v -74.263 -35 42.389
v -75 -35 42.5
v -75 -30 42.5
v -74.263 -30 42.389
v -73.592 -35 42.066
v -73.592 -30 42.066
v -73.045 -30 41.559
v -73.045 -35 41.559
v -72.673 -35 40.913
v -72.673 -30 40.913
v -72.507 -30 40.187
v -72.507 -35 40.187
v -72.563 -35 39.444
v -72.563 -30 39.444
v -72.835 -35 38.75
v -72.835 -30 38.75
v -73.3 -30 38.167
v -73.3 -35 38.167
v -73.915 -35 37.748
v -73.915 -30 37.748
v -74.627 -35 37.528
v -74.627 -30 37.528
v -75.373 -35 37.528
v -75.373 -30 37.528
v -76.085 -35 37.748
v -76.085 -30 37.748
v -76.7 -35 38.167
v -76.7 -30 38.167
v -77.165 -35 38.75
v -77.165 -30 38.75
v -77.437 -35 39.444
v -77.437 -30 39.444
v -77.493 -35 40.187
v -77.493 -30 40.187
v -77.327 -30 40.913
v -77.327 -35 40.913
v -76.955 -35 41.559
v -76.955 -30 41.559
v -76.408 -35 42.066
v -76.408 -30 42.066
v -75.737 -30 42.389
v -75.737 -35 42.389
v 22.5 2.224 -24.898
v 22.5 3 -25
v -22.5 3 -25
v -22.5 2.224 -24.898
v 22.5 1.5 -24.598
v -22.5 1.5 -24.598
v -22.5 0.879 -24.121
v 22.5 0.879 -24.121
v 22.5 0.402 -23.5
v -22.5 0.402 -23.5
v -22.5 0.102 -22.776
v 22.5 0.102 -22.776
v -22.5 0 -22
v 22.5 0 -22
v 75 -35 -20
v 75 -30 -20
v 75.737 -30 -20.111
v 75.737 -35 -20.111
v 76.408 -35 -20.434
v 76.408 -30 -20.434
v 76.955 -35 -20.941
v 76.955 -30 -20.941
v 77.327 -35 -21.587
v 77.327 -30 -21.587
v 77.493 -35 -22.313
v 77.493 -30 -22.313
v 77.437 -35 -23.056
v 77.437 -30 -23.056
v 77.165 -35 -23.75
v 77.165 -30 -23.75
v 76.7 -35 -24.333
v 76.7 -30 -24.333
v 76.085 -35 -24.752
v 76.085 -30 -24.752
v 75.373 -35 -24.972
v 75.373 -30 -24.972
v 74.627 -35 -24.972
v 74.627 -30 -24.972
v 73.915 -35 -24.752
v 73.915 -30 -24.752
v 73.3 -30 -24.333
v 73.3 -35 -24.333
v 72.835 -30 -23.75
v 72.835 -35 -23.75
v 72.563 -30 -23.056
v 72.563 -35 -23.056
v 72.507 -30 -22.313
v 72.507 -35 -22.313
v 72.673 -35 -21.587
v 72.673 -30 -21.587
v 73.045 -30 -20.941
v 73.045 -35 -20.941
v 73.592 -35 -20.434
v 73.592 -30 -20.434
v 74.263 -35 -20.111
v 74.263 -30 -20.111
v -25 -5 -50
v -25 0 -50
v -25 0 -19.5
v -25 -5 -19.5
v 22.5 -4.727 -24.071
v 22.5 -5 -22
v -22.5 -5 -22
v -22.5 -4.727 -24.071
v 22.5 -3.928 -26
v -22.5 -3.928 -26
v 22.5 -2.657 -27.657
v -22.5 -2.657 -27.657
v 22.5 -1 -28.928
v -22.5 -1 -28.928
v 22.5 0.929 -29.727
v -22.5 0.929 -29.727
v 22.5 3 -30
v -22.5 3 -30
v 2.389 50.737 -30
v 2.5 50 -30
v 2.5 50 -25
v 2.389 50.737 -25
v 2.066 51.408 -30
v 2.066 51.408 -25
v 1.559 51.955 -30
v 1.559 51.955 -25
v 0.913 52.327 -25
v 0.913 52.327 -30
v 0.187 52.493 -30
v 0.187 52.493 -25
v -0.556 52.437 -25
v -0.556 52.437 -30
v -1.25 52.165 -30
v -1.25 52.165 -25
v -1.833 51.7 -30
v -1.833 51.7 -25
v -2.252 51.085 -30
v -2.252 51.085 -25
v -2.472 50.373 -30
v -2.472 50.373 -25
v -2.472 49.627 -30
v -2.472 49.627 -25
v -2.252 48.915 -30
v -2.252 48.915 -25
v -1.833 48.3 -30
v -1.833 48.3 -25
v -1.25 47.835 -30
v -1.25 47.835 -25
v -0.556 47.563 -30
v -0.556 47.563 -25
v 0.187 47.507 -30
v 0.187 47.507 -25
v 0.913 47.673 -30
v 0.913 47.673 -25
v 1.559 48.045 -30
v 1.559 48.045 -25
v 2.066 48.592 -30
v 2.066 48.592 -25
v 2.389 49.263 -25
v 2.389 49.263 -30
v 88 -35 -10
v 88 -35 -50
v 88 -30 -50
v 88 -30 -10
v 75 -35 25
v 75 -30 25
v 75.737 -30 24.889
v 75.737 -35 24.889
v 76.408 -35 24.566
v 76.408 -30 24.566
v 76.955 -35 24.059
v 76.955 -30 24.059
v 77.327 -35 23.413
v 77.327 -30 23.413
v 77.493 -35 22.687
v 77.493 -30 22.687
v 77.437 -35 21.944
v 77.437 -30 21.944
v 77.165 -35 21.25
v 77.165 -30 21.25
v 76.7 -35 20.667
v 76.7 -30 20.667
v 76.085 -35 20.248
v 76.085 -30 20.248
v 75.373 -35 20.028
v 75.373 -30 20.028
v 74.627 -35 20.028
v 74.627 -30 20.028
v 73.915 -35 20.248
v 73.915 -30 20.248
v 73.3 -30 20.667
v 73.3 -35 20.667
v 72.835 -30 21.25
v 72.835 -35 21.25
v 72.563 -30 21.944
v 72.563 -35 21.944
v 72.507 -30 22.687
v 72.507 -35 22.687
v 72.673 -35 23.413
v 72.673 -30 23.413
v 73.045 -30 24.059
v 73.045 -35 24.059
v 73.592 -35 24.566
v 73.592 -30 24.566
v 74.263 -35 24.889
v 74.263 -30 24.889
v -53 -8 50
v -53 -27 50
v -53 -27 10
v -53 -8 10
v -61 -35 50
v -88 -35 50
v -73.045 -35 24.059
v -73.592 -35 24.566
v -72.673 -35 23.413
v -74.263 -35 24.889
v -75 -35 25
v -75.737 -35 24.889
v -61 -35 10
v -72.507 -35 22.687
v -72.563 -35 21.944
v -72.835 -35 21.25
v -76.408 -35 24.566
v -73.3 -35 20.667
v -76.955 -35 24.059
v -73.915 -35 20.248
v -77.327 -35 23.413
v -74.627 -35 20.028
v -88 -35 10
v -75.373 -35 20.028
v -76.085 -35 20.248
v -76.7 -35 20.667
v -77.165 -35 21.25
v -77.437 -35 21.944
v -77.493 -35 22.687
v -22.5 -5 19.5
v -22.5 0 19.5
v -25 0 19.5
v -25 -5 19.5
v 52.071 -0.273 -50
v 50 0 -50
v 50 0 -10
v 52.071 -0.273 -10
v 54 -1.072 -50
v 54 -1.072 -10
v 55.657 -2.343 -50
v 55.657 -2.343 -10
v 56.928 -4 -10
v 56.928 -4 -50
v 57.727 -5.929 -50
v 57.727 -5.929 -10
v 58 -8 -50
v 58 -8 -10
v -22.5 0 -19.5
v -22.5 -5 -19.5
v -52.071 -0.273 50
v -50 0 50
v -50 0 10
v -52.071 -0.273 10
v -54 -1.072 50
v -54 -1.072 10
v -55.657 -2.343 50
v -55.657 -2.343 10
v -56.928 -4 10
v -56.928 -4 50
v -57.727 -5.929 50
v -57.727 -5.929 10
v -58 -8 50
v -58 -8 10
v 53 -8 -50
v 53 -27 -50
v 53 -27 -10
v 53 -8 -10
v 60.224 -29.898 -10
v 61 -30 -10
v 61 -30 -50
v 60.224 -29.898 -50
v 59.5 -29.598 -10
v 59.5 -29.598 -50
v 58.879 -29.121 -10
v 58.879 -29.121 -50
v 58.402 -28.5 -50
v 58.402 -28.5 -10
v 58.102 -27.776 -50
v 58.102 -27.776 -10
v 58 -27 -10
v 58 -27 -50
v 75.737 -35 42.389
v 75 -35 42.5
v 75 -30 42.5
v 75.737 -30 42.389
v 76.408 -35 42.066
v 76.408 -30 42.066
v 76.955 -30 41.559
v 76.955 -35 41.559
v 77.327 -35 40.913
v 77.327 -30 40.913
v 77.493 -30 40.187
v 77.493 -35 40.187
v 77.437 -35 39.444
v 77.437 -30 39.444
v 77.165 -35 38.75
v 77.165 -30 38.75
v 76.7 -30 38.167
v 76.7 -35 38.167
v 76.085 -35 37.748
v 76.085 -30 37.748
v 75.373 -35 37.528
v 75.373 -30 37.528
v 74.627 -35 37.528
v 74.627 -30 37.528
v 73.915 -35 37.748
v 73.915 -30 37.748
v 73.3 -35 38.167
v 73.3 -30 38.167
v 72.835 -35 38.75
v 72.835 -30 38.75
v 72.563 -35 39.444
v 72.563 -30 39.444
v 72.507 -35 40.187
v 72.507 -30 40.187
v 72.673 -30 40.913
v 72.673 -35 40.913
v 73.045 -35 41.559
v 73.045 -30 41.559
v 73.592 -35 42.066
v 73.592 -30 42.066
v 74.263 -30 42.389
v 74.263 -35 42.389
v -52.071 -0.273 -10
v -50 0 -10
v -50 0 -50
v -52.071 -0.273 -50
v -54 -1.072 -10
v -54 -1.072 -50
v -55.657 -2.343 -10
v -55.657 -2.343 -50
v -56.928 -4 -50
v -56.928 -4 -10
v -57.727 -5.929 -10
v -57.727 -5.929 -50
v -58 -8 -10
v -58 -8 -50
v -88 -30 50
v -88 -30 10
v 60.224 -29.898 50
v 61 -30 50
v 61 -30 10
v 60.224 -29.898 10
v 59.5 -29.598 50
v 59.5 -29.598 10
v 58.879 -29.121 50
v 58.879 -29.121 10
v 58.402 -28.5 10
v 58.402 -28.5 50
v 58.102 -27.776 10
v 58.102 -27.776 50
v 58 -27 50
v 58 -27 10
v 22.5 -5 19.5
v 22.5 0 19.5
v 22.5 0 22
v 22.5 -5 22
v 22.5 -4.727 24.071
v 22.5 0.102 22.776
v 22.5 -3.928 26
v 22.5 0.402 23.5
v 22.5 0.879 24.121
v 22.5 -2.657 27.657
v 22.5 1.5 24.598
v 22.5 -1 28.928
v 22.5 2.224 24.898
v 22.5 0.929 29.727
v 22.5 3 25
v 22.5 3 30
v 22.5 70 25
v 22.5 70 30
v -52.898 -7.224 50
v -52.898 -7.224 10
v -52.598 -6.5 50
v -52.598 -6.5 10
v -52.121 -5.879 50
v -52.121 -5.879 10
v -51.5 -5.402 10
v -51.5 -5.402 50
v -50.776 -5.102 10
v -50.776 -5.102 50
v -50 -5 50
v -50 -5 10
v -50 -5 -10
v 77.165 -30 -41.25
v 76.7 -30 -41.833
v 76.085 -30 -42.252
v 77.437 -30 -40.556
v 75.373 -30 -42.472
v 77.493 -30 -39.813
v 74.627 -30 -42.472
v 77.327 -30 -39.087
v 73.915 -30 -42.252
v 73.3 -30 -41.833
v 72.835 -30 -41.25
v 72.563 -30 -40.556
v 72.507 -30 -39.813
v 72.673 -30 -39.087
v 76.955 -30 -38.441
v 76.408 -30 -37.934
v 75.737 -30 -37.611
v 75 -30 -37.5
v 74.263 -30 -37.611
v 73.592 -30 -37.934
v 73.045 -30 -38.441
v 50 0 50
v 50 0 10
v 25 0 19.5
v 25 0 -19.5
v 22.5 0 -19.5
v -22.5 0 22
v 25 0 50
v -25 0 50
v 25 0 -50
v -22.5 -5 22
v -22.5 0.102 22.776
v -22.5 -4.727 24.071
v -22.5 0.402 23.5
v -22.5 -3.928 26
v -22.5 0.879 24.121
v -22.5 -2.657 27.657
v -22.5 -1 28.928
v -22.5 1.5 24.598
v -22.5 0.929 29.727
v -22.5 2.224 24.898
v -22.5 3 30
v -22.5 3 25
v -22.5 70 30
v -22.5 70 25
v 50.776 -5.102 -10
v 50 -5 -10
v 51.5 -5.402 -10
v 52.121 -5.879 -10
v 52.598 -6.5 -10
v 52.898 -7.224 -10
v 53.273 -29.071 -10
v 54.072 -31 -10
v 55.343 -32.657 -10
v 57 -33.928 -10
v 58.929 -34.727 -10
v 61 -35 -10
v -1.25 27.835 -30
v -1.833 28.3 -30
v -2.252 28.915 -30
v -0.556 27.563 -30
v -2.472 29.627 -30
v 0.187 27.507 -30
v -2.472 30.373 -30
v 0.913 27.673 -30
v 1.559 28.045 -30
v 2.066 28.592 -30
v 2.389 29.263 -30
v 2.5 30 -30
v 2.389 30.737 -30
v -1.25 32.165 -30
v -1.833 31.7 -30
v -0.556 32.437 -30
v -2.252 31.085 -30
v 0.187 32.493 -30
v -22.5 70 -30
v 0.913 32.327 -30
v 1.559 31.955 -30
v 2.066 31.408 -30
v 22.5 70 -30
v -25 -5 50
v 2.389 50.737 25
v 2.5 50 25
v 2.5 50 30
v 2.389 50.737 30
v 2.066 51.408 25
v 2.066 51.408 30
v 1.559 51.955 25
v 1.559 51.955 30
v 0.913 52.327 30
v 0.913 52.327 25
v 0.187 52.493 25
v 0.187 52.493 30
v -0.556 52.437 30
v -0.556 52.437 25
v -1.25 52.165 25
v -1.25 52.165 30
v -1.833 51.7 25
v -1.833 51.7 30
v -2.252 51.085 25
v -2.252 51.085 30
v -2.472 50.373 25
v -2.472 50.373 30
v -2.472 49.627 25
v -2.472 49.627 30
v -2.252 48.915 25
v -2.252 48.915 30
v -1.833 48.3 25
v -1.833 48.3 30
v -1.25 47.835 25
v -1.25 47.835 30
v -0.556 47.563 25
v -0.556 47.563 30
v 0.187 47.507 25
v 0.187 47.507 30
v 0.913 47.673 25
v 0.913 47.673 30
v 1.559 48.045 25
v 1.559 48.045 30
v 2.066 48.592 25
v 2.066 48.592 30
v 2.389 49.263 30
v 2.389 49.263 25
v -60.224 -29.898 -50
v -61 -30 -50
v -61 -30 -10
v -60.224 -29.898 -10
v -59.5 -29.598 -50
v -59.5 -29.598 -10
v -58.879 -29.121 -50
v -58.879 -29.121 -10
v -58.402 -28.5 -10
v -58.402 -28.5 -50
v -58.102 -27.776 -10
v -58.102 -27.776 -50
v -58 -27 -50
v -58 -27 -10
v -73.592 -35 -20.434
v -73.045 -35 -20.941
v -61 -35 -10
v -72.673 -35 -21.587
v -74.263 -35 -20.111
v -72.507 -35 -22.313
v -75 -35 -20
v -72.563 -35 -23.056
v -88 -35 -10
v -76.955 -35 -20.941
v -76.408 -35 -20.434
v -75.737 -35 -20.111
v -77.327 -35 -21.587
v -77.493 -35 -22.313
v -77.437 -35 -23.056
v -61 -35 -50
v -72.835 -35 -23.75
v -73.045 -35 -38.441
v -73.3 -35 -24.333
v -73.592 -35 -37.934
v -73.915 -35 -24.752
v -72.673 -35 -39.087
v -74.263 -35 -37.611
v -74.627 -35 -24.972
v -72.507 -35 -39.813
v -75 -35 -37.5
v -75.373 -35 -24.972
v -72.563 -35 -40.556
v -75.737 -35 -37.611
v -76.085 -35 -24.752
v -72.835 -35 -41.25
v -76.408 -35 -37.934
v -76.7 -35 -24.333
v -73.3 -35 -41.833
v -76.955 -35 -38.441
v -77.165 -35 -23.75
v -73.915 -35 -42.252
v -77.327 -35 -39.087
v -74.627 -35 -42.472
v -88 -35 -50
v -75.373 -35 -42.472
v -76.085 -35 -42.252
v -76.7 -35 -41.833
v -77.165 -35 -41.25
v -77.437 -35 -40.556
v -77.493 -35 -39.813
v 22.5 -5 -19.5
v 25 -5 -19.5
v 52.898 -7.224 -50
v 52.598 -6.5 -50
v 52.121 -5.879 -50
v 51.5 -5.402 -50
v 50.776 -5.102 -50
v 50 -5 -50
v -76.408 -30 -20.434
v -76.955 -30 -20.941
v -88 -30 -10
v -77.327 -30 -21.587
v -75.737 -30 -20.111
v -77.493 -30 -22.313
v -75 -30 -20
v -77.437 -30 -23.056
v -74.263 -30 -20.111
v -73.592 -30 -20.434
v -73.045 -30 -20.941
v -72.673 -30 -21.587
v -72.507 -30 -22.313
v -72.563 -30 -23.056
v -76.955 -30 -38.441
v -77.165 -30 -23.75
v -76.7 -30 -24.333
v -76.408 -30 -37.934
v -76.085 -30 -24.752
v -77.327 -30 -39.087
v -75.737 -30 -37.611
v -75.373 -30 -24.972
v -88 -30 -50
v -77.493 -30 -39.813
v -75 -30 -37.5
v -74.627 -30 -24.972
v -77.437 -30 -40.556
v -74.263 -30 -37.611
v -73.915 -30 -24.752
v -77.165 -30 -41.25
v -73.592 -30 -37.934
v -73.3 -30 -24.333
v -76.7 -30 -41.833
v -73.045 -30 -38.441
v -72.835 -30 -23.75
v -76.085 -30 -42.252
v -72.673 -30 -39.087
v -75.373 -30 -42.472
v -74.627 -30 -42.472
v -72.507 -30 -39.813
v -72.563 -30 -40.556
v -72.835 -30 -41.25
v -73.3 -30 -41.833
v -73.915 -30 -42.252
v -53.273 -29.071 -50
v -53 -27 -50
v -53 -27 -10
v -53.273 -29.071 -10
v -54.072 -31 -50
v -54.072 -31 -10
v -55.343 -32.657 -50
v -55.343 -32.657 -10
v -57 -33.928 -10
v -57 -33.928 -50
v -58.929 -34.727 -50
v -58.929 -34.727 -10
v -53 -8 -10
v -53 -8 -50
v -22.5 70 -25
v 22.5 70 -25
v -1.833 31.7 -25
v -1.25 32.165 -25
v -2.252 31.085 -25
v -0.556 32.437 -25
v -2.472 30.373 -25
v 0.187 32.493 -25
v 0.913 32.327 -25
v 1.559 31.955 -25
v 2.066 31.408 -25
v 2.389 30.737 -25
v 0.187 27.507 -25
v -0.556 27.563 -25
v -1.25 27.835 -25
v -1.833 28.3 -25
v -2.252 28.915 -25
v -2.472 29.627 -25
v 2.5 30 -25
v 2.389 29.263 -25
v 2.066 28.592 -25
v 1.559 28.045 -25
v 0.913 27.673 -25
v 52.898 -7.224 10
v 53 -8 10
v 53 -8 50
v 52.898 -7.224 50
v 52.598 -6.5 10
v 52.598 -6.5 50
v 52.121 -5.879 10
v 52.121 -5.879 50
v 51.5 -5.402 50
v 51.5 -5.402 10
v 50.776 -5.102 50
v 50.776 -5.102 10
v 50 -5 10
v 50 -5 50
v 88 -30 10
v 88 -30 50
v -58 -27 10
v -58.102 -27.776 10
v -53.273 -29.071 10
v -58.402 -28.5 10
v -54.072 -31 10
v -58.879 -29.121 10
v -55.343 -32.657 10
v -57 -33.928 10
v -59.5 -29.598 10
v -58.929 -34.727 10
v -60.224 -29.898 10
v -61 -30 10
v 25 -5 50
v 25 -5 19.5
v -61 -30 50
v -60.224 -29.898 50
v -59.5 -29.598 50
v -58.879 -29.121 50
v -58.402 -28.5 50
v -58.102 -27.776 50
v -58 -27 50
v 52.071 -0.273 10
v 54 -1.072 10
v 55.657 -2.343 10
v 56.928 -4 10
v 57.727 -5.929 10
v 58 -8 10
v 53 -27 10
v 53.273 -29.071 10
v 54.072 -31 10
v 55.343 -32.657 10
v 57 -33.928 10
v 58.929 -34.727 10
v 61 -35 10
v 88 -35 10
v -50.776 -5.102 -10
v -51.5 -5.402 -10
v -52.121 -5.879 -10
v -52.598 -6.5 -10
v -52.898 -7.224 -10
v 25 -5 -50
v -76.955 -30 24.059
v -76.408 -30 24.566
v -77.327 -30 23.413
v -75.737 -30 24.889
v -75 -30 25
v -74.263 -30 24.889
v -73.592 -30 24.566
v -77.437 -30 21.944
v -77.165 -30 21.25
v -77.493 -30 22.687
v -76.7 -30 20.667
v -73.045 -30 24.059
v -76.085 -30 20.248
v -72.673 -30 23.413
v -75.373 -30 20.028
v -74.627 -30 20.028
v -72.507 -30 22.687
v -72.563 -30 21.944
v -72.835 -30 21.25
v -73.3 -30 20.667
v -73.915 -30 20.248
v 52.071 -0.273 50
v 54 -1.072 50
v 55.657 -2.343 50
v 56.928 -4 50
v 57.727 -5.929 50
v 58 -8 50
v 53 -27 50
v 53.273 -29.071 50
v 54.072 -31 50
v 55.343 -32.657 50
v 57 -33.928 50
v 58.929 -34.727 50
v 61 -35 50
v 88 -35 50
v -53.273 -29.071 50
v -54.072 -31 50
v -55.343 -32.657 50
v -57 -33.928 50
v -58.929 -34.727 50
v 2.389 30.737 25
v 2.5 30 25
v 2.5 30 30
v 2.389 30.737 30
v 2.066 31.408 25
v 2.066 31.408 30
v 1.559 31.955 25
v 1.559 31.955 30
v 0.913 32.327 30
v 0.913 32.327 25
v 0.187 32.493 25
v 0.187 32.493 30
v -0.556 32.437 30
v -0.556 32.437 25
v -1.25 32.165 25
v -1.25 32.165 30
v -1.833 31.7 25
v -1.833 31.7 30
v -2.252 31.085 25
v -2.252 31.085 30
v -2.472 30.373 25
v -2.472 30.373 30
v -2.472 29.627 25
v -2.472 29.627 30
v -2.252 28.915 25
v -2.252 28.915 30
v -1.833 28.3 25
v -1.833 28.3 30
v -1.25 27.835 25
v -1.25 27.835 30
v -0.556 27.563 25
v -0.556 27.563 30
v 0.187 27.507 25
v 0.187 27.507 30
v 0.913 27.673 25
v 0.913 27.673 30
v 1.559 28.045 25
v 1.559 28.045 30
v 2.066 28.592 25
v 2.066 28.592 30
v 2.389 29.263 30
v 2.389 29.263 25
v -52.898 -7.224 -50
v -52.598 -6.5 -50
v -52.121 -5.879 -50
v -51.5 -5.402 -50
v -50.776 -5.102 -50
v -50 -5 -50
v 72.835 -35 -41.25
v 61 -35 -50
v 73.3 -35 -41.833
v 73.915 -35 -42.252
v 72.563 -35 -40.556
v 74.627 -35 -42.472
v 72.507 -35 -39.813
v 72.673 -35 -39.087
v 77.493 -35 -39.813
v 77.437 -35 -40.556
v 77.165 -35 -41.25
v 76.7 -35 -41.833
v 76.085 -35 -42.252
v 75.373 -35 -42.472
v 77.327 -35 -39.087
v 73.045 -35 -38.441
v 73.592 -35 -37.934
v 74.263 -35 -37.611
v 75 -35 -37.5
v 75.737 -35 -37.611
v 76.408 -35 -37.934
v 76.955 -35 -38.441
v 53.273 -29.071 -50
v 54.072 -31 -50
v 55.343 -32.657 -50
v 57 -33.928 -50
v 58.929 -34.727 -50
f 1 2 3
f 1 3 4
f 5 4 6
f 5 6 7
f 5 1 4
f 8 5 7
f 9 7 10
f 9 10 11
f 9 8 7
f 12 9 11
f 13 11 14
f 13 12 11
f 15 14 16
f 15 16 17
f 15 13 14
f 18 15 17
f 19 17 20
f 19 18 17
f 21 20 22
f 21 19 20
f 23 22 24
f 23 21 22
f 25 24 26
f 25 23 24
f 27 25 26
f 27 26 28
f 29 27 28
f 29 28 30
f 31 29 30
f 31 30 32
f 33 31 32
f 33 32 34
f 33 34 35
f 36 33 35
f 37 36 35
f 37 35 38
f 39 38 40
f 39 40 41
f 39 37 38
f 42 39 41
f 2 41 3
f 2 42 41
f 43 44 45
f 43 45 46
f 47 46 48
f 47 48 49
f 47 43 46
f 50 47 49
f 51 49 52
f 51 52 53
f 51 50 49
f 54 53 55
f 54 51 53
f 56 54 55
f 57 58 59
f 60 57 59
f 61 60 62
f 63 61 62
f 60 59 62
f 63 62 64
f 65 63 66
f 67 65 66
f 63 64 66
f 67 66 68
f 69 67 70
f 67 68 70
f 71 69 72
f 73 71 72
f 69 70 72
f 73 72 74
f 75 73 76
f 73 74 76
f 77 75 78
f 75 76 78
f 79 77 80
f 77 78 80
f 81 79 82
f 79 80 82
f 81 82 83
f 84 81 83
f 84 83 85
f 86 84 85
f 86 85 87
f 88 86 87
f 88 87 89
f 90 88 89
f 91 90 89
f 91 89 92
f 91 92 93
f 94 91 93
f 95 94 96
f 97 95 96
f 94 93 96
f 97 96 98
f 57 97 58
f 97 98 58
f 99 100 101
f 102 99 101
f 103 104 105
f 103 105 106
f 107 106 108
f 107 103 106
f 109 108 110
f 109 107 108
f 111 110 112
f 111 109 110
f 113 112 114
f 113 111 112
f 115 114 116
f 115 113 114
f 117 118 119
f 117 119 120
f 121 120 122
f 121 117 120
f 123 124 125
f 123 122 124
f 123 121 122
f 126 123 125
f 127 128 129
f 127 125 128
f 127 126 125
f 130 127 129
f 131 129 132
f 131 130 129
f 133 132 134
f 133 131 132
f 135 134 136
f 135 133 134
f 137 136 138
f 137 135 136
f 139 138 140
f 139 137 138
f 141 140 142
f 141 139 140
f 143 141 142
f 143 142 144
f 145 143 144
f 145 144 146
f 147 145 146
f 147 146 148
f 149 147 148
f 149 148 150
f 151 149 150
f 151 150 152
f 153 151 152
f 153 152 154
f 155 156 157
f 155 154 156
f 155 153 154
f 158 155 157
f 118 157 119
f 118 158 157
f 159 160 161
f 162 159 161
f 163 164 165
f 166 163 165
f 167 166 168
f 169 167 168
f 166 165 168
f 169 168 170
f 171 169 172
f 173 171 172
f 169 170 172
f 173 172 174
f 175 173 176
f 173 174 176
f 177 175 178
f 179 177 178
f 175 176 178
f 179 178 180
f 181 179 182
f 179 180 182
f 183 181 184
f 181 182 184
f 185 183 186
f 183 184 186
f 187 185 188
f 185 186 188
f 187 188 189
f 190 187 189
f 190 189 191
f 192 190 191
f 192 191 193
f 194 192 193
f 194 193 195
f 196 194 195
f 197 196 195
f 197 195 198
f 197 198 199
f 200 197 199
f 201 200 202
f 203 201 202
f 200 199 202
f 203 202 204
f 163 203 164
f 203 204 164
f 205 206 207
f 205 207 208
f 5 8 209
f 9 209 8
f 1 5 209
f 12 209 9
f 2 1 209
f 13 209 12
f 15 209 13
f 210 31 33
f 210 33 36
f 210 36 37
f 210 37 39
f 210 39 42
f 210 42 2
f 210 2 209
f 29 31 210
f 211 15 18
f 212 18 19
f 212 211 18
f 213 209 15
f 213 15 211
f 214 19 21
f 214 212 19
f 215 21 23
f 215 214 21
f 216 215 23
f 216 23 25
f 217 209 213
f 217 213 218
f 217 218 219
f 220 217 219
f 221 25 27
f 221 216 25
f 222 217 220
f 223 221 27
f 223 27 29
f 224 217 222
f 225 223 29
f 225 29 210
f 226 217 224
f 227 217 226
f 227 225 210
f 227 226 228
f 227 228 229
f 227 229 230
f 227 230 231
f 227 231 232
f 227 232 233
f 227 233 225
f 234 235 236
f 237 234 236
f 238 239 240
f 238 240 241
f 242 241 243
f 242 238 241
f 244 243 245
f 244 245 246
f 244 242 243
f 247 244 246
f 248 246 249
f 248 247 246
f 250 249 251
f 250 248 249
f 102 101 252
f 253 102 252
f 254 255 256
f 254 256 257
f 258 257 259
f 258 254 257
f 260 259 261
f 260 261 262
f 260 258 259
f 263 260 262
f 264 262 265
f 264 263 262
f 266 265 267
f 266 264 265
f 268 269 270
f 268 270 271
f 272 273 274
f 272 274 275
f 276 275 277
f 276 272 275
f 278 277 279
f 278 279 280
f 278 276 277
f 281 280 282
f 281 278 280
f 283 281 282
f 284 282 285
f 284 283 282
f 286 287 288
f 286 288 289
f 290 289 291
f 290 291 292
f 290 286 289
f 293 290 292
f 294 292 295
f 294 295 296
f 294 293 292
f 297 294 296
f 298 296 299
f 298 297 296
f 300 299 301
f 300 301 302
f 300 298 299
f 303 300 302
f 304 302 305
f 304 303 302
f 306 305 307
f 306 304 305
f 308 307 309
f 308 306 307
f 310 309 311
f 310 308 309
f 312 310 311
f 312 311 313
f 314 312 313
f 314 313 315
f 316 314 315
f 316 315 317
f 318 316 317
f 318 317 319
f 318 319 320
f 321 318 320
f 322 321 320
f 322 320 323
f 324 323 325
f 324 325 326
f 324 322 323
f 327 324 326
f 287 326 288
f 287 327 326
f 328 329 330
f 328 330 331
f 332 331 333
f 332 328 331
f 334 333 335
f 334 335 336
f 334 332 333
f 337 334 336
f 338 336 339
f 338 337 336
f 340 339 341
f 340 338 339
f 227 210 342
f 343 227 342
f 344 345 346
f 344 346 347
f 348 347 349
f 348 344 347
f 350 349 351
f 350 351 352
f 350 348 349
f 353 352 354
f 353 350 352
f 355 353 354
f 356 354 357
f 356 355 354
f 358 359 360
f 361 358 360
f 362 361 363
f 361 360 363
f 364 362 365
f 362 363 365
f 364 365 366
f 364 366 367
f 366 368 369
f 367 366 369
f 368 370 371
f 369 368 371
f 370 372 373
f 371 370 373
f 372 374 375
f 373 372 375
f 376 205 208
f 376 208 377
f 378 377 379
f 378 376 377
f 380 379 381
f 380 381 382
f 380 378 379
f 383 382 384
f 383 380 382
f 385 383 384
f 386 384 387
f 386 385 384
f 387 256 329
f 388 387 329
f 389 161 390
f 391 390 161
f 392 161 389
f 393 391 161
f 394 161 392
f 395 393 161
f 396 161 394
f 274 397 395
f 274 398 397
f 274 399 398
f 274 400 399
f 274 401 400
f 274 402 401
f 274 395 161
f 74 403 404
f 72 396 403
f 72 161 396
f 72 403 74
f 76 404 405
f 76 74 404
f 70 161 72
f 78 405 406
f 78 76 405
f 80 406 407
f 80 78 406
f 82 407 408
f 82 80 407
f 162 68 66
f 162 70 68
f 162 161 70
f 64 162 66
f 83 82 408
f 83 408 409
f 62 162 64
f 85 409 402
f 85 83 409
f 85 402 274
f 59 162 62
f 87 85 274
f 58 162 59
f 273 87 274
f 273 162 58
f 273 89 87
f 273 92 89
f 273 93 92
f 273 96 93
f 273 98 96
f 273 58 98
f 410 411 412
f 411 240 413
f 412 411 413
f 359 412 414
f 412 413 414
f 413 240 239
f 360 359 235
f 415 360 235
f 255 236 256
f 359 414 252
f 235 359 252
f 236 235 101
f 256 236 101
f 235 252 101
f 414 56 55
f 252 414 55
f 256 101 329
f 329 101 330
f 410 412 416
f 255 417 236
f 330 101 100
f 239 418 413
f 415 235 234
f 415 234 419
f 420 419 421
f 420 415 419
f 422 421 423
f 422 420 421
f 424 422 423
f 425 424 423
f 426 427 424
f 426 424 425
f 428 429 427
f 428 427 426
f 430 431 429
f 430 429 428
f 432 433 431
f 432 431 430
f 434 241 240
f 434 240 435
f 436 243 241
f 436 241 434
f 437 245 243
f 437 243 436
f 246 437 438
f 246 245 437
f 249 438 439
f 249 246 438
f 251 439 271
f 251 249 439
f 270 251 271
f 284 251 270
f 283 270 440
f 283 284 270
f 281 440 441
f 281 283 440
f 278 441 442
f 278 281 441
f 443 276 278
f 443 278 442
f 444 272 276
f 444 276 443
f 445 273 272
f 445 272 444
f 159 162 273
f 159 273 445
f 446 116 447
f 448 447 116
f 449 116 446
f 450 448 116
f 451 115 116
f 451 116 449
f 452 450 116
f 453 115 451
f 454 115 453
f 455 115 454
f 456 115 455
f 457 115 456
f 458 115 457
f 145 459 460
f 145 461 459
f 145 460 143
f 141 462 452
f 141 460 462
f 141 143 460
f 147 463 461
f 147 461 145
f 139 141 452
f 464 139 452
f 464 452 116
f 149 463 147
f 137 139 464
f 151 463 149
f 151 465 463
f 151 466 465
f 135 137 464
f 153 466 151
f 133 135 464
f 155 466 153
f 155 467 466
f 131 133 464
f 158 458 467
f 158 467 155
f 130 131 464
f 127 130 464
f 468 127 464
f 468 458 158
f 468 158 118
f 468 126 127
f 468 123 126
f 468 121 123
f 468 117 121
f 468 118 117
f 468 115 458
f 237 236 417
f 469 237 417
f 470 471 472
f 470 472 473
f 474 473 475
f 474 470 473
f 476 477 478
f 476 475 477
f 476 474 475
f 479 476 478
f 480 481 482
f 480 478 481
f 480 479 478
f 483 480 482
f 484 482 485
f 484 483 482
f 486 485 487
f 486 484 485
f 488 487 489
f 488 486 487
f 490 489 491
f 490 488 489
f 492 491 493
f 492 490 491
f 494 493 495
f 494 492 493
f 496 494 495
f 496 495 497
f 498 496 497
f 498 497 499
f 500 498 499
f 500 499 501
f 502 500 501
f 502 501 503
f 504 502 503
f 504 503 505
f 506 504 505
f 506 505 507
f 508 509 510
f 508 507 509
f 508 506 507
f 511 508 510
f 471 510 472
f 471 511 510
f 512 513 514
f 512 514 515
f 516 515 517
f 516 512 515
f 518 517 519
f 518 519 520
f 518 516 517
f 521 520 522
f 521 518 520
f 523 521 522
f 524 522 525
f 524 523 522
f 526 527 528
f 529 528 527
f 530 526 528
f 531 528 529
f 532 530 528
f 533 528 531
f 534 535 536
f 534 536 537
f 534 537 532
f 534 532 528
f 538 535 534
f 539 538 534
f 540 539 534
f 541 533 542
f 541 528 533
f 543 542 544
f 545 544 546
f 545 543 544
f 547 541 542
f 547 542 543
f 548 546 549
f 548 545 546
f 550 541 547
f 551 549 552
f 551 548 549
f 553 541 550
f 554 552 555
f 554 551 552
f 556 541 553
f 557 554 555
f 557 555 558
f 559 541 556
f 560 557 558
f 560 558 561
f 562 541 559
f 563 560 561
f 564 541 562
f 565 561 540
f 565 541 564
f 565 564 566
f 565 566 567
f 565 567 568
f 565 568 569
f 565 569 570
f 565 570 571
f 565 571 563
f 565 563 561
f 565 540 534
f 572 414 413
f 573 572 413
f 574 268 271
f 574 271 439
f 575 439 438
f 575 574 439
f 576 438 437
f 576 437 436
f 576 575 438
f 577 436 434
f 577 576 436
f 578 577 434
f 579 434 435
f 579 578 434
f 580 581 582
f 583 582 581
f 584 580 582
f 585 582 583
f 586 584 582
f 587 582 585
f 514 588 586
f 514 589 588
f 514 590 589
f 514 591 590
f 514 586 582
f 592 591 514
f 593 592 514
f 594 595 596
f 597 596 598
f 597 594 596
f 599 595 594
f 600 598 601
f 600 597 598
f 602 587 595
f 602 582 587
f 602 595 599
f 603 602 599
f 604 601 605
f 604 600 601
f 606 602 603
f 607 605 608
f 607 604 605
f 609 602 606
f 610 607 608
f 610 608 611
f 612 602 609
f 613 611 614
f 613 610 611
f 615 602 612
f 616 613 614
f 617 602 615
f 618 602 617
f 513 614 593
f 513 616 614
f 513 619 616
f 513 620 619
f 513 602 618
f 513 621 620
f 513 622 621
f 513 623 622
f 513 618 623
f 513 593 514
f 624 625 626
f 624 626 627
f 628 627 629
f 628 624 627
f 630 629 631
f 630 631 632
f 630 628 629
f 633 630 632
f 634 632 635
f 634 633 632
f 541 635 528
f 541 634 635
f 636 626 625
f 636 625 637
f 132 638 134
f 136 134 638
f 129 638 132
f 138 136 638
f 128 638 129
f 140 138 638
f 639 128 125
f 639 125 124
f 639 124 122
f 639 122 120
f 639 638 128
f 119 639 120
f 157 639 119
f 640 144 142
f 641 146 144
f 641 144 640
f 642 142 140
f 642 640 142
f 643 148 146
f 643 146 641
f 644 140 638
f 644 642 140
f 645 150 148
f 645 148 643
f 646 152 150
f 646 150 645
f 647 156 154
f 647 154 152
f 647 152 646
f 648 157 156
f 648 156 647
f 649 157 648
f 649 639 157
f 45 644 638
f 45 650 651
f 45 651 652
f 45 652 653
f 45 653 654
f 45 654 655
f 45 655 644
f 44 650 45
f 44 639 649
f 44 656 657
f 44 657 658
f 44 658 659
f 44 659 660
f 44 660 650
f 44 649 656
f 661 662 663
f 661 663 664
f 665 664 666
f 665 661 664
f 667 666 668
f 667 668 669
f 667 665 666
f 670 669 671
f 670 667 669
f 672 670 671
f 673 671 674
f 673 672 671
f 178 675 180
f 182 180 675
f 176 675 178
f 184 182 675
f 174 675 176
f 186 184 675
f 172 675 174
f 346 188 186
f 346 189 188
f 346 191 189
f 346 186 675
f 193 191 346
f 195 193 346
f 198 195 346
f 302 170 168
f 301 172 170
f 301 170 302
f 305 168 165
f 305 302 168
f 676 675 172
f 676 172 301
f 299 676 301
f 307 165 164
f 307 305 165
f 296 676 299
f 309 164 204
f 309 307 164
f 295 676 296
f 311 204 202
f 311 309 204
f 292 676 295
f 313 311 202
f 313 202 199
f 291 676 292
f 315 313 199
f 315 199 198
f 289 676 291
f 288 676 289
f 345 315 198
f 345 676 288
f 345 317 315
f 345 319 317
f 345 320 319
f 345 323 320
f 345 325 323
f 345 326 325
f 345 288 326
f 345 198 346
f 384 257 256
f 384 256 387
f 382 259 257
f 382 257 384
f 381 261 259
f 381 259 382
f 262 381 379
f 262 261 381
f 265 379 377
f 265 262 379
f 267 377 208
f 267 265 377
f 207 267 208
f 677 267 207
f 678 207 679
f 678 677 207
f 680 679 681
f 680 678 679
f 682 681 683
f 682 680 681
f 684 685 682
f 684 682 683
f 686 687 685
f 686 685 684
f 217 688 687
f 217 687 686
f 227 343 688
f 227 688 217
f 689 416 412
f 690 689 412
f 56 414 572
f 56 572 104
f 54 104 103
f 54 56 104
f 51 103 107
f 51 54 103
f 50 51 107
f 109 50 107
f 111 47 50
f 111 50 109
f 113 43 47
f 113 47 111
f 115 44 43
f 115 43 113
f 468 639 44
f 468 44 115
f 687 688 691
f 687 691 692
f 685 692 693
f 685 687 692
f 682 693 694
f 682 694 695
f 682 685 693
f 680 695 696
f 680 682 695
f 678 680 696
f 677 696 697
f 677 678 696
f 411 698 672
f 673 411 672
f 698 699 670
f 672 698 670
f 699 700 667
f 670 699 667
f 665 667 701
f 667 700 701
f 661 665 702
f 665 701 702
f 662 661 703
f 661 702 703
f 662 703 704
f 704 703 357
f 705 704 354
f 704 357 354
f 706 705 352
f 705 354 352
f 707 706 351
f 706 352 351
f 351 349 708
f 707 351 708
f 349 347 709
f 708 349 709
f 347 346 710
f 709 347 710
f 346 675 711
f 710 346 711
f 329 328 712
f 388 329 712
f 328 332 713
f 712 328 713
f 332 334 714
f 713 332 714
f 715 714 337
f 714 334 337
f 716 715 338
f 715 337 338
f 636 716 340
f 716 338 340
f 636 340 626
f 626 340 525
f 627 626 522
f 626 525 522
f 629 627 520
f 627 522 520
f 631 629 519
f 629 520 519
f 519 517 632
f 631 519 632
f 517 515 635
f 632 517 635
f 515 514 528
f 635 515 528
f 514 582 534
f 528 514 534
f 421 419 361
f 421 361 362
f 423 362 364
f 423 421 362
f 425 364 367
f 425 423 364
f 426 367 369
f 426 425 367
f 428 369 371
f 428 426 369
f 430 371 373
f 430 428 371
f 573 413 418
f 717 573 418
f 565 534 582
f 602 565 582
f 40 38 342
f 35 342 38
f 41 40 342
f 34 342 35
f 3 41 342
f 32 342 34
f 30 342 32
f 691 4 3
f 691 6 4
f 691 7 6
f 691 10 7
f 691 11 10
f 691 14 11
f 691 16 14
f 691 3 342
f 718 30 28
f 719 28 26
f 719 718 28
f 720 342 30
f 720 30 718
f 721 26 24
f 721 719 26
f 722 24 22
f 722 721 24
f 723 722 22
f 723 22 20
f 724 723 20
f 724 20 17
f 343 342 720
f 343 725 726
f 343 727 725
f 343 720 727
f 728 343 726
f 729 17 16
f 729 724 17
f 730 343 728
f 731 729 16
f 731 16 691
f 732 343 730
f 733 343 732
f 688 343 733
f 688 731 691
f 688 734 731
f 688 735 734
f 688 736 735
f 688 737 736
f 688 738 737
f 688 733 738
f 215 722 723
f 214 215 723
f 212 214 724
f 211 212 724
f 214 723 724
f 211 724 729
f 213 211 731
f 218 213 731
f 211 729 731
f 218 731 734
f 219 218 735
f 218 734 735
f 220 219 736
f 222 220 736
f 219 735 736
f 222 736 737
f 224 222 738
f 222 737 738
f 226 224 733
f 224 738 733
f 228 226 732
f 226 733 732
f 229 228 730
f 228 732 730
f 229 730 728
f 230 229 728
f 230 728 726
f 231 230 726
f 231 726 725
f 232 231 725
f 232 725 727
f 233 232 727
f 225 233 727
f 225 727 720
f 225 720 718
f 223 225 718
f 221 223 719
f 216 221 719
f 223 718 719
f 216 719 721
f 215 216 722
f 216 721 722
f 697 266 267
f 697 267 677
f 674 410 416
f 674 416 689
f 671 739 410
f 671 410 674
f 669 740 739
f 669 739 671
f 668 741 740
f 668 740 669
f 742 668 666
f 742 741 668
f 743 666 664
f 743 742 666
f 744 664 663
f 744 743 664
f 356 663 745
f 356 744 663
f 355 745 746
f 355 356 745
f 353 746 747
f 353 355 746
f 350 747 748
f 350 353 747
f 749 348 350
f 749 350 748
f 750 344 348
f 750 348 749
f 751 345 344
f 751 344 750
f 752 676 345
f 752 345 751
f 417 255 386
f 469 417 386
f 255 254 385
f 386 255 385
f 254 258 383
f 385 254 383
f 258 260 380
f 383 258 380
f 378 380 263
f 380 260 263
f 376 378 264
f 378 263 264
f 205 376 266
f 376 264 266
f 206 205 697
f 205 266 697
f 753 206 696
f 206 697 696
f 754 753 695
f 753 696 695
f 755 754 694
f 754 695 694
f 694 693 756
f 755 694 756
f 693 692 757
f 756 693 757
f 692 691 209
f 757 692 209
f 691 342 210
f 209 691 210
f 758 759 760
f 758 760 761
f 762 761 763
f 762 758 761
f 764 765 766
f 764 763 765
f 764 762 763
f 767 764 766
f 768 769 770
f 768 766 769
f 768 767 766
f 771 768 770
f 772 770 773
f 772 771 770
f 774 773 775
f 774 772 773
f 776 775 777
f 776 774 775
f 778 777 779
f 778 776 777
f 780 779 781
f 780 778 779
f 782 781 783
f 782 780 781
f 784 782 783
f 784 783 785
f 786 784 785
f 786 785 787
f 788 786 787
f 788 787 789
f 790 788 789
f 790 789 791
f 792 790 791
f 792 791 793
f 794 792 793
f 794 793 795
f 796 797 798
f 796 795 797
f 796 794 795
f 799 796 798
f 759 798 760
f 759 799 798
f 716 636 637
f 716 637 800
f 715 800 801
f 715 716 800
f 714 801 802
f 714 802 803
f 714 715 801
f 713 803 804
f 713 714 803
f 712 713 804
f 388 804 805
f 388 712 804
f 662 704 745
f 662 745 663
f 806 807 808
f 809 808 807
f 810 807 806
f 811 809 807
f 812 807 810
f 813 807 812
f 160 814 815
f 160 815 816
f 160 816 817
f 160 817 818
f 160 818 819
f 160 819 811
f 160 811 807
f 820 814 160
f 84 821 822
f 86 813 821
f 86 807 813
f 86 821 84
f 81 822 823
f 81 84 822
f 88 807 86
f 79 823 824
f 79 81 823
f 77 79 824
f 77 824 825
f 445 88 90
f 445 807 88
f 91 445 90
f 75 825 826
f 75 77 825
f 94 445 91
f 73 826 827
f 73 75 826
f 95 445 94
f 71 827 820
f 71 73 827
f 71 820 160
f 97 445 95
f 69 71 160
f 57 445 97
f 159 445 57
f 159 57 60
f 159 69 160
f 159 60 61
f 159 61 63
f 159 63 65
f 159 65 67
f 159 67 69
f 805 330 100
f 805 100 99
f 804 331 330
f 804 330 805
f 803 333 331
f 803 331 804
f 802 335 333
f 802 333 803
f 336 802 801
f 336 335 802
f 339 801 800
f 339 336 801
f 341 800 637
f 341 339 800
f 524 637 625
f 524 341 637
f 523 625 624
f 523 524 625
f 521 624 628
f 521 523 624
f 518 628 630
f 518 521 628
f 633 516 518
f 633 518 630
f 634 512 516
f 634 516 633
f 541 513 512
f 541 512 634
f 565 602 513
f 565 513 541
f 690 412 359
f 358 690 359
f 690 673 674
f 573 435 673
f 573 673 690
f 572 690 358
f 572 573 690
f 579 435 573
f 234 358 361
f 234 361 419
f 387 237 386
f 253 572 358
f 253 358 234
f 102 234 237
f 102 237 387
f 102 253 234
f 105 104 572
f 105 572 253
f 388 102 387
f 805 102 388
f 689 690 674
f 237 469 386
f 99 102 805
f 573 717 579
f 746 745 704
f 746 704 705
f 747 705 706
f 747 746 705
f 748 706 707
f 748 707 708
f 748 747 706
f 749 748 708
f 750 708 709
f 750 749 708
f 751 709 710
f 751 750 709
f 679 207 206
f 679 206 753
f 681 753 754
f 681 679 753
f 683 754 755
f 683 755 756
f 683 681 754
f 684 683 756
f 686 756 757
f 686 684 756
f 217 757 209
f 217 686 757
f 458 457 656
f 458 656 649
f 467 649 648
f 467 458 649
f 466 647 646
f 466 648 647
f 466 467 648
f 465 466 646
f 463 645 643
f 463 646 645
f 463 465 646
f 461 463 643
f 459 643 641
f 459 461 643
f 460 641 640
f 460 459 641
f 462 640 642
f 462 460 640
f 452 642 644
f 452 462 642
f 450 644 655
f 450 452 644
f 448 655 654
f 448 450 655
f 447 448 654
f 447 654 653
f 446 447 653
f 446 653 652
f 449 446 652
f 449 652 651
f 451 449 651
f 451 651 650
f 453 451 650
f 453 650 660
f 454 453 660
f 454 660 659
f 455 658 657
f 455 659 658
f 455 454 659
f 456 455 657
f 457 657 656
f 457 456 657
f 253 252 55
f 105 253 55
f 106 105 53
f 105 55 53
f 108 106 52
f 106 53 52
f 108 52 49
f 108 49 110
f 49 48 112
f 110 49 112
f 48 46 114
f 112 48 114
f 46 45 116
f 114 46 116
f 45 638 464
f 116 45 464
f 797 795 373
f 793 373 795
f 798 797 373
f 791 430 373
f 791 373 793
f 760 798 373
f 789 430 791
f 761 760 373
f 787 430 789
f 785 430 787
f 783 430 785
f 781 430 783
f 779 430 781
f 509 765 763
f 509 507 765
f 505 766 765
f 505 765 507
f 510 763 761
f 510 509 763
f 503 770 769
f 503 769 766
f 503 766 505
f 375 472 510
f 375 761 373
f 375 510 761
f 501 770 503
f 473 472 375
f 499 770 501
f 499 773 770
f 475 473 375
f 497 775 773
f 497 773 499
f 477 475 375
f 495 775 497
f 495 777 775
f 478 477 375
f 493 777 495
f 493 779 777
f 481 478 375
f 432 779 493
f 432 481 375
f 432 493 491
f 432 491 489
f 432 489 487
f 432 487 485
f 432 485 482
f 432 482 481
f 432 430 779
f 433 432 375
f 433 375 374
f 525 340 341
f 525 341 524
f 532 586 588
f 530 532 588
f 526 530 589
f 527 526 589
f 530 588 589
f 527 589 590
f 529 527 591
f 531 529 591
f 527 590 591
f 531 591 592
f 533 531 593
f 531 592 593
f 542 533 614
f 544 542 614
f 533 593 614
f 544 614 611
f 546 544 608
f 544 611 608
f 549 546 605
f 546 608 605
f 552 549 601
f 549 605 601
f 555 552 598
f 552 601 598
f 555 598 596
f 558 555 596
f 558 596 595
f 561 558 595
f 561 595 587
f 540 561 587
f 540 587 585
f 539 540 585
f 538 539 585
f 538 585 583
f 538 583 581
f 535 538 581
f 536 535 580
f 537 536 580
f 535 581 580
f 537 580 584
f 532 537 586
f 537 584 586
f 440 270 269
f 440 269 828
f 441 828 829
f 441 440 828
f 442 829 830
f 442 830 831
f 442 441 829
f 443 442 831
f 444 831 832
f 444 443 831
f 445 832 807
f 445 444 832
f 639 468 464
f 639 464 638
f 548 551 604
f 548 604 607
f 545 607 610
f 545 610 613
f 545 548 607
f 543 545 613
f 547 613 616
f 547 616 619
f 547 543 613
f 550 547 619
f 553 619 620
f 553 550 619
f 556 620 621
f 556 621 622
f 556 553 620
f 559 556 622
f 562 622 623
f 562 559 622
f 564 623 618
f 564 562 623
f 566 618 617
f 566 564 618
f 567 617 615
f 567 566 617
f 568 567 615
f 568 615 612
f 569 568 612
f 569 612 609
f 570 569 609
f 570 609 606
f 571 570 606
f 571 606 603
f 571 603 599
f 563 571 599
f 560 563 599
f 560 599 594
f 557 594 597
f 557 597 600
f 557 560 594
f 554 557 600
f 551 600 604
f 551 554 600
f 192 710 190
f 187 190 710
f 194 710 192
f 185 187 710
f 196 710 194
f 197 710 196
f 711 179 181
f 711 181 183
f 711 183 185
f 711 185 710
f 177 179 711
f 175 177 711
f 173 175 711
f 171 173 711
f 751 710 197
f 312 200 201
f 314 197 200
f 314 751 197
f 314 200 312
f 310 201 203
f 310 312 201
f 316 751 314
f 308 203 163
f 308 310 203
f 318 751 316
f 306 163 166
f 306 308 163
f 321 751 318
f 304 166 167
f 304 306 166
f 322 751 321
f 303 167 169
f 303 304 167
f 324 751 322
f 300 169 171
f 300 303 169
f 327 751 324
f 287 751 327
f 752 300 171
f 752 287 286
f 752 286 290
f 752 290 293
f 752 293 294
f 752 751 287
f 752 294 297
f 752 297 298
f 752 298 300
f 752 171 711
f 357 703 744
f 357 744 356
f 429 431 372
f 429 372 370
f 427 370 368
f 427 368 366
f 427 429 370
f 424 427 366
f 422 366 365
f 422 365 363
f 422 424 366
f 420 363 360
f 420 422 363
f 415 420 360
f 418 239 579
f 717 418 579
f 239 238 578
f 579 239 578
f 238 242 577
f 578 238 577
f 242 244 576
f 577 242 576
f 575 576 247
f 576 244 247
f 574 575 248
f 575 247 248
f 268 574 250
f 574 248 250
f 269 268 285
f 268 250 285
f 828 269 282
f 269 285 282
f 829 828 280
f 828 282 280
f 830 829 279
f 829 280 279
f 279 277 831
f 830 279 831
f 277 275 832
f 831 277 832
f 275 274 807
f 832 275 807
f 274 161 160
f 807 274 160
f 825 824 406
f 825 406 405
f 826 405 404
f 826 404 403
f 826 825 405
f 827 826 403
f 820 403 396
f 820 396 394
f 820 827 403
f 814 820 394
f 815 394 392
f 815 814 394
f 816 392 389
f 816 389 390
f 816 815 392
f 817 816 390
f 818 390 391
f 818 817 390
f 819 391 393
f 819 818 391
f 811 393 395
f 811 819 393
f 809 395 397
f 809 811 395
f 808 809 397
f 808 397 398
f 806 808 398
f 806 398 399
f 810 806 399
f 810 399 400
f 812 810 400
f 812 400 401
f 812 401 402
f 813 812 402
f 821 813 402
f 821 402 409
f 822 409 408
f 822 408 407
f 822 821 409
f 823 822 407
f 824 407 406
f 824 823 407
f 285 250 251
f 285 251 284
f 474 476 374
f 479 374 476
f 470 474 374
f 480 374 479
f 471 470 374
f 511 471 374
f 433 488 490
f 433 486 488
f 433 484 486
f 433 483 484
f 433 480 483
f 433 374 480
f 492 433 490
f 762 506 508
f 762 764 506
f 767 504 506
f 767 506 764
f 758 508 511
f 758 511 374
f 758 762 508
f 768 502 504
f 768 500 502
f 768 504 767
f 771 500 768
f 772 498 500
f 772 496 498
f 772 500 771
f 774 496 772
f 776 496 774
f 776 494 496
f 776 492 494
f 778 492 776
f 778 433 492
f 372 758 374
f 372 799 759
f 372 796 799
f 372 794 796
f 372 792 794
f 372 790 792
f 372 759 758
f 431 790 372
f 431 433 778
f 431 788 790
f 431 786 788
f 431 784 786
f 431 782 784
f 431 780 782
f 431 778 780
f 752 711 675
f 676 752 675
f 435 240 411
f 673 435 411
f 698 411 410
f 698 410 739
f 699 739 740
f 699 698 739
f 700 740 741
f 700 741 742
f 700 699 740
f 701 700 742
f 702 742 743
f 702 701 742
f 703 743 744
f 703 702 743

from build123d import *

# Parameters (mm, degrees)
SM_BASE_FLANGE_1_DEPTH            = 5
SM_EDGE_FLANGE_1_STRIP_W          = 26
SM_EDGE_FLANGE_1_STRIP_H          = 5
SM_EDGE_FLANGE_1_STRIP_CUT_DEPTH  = 45
SM_EDGE_FLANGE_1_RELIEF_W         = 28.5
SM_EDGE_FLANGE_1_RELIEF_H         = 2.5
SM_EDGE_FLANGE_1_RELIEF_CUT_DEPTH = 5
SM_EDGE_FLANGE_1_DEPTH            = 45
SM_EDGE_FLANGE_2_STRIP_W          = 26
SM_EDGE_FLANGE_2_STRIP_H          = 5
SM_EDGE_FLANGE_2_STRIP_CUT_DEPTH  = 45
SM_EDGE_FLANGE_2_RELIEF_W         = 28.5
SM_EDGE_FLANGE_2_RELIEF_H         = 2.5
SM_EDGE_FLANGE_2_RELIEF_CUT_DEPTH = 5
SM_EDGE_FLANGE_2_DEPTH            = 45
SM_EDGE_FLANGE_14_DEPTH           = 40
SM_EDGE_FLANGE_15_DEPTH           = 40
SM_EDGE_FLANGE_16_DEPTH           = 40
SM_EDGE_FLANGE_17_DEPTH           = 40
SM_EDGE_FLANGE_18_STRIP_W         = 26
SM_EDGE_FLANGE_18_STRIP_H         = 5
SM_EDGE_FLANGE_18_STRIP_CUT_DEPTH = 40
SM_EDGE_FLANGE_18_DEPTH           = 40
SM_EDGE_FLANGE_19_STRIP_W         = 26
SM_EDGE_FLANGE_19_STRIP_H         = 5
SM_EDGE_FLANGE_19_STRIP_CUT_DEPTH = 40
SM_EDGE_FLANGE_19_DEPTH           = 40
SM_EDGE_FLANGE_20_STRIP_W         = 26
SM_EDGE_FLANGE_20_STRIP_H         = 5
SM_EDGE_FLANGE_20_STRIP_CUT_DEPTH = 40
SM_EDGE_FLANGE_20_DEPTH           = 40
SM_EDGE_FLANGE_21_STRIP_W         = 26
SM_EDGE_FLANGE_21_STRIP_H         = 5
SM_EDGE_FLANGE_21_STRIP_CUT_DEPTH = 40
SM_EDGE_FLANGE_21_DEPTH           = 40
CUT_EXTRUDE_START                 = -35
SKETCH_80_R                       = 2.5
CUT_EXTRUDE_1_DEPTH               = 5
CUT_EXTRUDE_3_DEPTH               = 124.060960503
CUT_EXTRUDE_3_DEPTH_BACK          = 124.060960503
SKETCH_83_R                       = 2.5
CUT_EXTRUDE_START_2               = -30
SKETCH_84_R                       = 2.5
CUT_EXTRUDE_5_DEPTH               = 5


# Sheet-metal steps are written as plain solids
with BuildPart() as part:
    # Sketch 1 → 基体-法兰1 (new body)
    with BuildSketch(Plane(origin=(0, 0, 0), x_dir=(1, 0, 0), z_dir=(0, 1, 0))):
        Polygon((-25, -25), (-25, -50), (-50, -50), (-50, 50), (-25, 50), (-25, 25), (25, 25), (25, 50), (50, 50), (50, -50), (25, -50), (25, -25), align=None)
    extrude(amount=-SM_BASE_FLANGE_1_DEPTH)

    # 边线-法兰1 strip (across the edge) → 边线-法兰1 strip cut (cut)
    with BuildSketch(Plane(origin=(22.5, 0, -25), x_dir=(0, 0, 1), z_dir=(-1, 0, 0))):
        with Locations((-10, -2.5)):
            Rectangle(SM_EDGE_FLANGE_1_STRIP_W, SM_EDGE_FLANGE_1_STRIP_H)
    extrude(amount=SM_EDGE_FLANGE_1_STRIP_CUT_DEPTH, mode=Mode.SUBTRACT)

    # 边线-法兰1 relief (on the sheet) → 边线-法兰1 relief cut (cut)
    with BuildSketch(Plane(origin=(22.5, 0, -22), x_dir=(0, 0, 1), z_dir=(0, 1, 0))):
        with Locations((-11.75, 1.25)):
            Rectangle(SM_EDGE_FLANGE_1_RELIEF_W, SM_EDGE_FLANGE_1_RELIEF_H)
        with Locations((-11.75, -46.25)):
            Rectangle(SM_EDGE_FLANGE_1_RELIEF_W, SM_EDGE_FLANGE_1_RELIEF_H)
    extrude(amount=-SM_EDGE_FLANGE_1_RELIEF_CUT_DEPTH, mode=Mode.SUBTRACT)

    # 边线-法兰1 section (across the edge) → 边线-法兰1 (add)
    with BuildSketch(Plane(origin=(22.5, 0, -25), x_dir=(0, 0, 1), z_dir=(-1, 0, 0))):
        with BuildLine():
            Line((-5, 3), (-5, 70))
            Line((-5, 70), (0, 70))
            Line((0, 70), (0, 3))
            ThreePointArc((0, 3), (0.878679656, 0.878679656), (3, 0))
            Line((3, 0), (3, -5))
            ThreePointArc((3, -5), (-2.656854249, -2.656854249), (-5, 3))
        make_face()
    extrude(amount=SM_EDGE_FLANGE_1_DEPTH)

    # 边线-法兰2 strip (across the edge) → 边线-法兰2 strip cut (cut)
    with BuildSketch(Plane(origin=(-22.5, 0, 25), x_dir=(0, 0, -1), z_dir=(1, 0, 0))):
        with Locations((-10, -2.5)):
            Rectangle(SM_EDGE_FLANGE_2_STRIP_W, SM_EDGE_FLANGE_2_STRIP_H)
    extrude(amount=SM_EDGE_FLANGE_2_STRIP_CUT_DEPTH, mode=Mode.SUBTRACT)

    # 边线-法兰2 relief (on the sheet) → 边线-法兰2 relief cut (cut)
    with BuildSketch(Plane(origin=(-22.5, 0, 22), x_dir=(0, 0, -1), z_dir=(0, 1, 0))):
        with Locations((-11.75, 1.25)):
            Rectangle(SM_EDGE_FLANGE_2_RELIEF_W, SM_EDGE_FLANGE_2_RELIEF_H)
        with Locations((-11.75, -46.25)):
            Rectangle(SM_EDGE_FLANGE_2_RELIEF_W, SM_EDGE_FLANGE_2_RELIEF_H)
    extrude(amount=-SM_EDGE_FLANGE_2_RELIEF_CUT_DEPTH, mode=Mode.SUBTRACT)

    # 边线-法兰2 section (across the edge) → 边线-法兰2 (add)
    with BuildSketch(Plane(origin=(-22.5, 0, 25), x_dir=(0, 0, -1), z_dir=(1, 0, 0))):
        with BuildLine():
            Line((-5, 3), (-5, 70))
            Line((-5, 70), (0, 70))
            Line((0, 70), (0, 3))
            ThreePointArc((0, 3), (0.878679656, 0.878679656), (3, 0))
            Line((3, 0), (3, -5))
            ThreePointArc((3, -5), (-2.656854249, -2.656854249), (-5, 3))
        make_face()
    extrude(amount=SM_EDGE_FLANGE_2_DEPTH)

    # 边线-法兰14 section (across the edge) → 边线-法兰14 (add)
    with BuildSketch(Plane(origin=(53, -5, 10), x_dir=(-1, 0, 0), z_dir=(0, 0, 1))):
        with BuildLine():
            Line((-5, 3), (-5, 30))
            Line((-5, 30), (0, 30))
            Line((0, 30), (0, 3))
            ThreePointArc((0, 3), (0.878679656, 0.878679656), (3, 0))
            Line((3, 0), (3, -5))
            ThreePointArc((3, -5), (-2.656854249, -2.656854249), (-5, 3))
        make_face()
    extrude(amount=SM_EDGE_FLANGE_14_DEPTH)

    # 边线-法兰15 section (across the edge) → 边线-法兰15 (add)
    with BuildSketch(Plane(origin=(53, -5, -50), x_dir=(-1, 0, 0), z_dir=(0, 0, 1))):
        with BuildLine():
            Line((-5, 3), (-5, 30))
            Line((-5, 30), (0, 30))
            Line((0, 30), (0, 3))
            ThreePointArc((0, 3), (0.878679656, 0.878679656), (3, 0))
            Line((3, 0), (3, -5))
            ThreePointArc((3, -5), (-2.656854249, -2.656854249), (-5, 3))
        make_face()
    extrude(amount=SM_EDGE_FLANGE_15_DEPTH)

    # 边线-法兰16 section (across the edge) → 边线-法兰16 (add)
    with BuildSketch(Plane(origin=(-53, -5, -10), x_dir=(1, 0, 0), z_dir=(0, 0, -1))):
        with BuildLine():
            Line((-5, 3), (-5, 30))
            Line((-5, 30), (0, 30))
            Line((0, 30), (0, 3))
            ThreePointArc((0, 3), (0.878679656, 0.878679656), (3, 0))
            Line((3, 0), (3, -5))
            ThreePointArc((3, -5), (-2.656854249, -2.656854249), (-5, 3))
        make_face()
    extrude(amount=SM_EDGE_FLANGE_16_DEPTH)

    # 边线-法兰17 section (across the edge) → 边线-法兰17 (add)
    with BuildSketch(Plane(origin=(-53, -5, 50), x_dir=(1, 0, 0), z_dir=(0, 0, -1))):
        with BuildLine():
            Line((-5, 3), (-5, 30))
            Line((-5, 30), (0, 30))
            Line((0, 30), (0, 3))
            ThreePointArc((0, 3), (0.878679656, 0.878679656), (3, 0))
            Line((3, 0), (3, -5))
            ThreePointArc((3, -5), (-2.656854249, -2.656854249), (-5, 3))
        make_face()
    extrude(amount=SM_EDGE_FLANGE_17_DEPTH)

    # 边线-法兰18 strip (across the edge) → 边线-法兰18 strip cut (cut)
    with BuildSketch(Plane(origin=(-58, -35, -50), x_dir=(0, 1, 0), z_dir=(0, 0, 1))):
        with Locations((-5, -2.5)):
            Rectangle(SM_EDGE_FLANGE_18_STRIP_W, SM_EDGE_FLANGE_18_STRIP_H)
    extrude(amount=SM_EDGE_FLANGE_18_STRIP_CUT_DEPTH, mode=Mode.SUBTRACT)

    # 边线-法兰18 section (across the edge) → 边线-法兰18 (add)
    with BuildSketch(Plane(origin=(-58, -35, -50), x_dir=(0, 1, 0), z_dir=(0, 0, 1))):
        with BuildLine():
            Line((0, 3), (0, 30))
            Line((0, 30), (5, 30))
            Line((5, 30), (5, 3))
            ThreePointArc((5, 3), (5.878679656, 0.878679656), (8, 0))
            Line((8, 0), (8, -5))
            ThreePointArc((8, -5), (2.343145751, -2.656854249), (0, 3))
        make_face()
    extrude(amount=SM_EDGE_FLANGE_18_DEPTH)

    # 边线-法兰19 strip (across the edge) → 边线-法兰19 strip cut (cut)
    with BuildSketch(Plane(origin=(-58, -35, 10), x_dir=(0, 1, 0), z_dir=(0, 0, 1))):
        with Locations((-5, -2.5)):
            Rectangle(SM_EDGE_FLANGE_19_STRIP_W, SM_EDGE_FLANGE_19_STRIP_H)
    extrude(amount=SM_EDGE_FLANGE_19_STRIP_CUT_DEPTH, mode=Mode.SUBTRACT)

    # 边线-法兰19 section (across the edge) → 边线-法兰19 (add)
    with BuildSketch(Plane(origin=(-58, -35, 10), x_dir=(0, 1, 0), z_dir=(0, 0, 1))):
        with BuildLine():
            Line((0, 3), (0, 30))
            Line((0, 30), (5, 30))
            Line((5, 30), (5, 3))
            ThreePointArc((5, 3), (5.878679656, 0.878679656), (8, 0))
            Line((8, 0), (8, -5))
            ThreePointArc((8, -5), (2.343145751, -2.656854249), (0, 3))
        make_face()
    extrude(amount=SM_EDGE_FLANGE_19_DEPTH)

    # 边线-法兰20 strip (across the edge) → 边线-法兰20 strip cut (cut)
    with BuildSketch(Plane(origin=(58, -35, 50), x_dir=(0, 1, 0), z_dir=(0, 0, -1))):
        with Locations((-5, -2.5)):
            Rectangle(SM_EDGE_FLANGE_20_STRIP_W, SM_EDGE_FLANGE_20_STRIP_H)
    extrude(amount=SM_EDGE_FLANGE_20_STRIP_CUT_DEPTH, mode=Mode.SUBTRACT)

    # 边线-法兰20 section (across the edge) → 边线-法兰20 (add)
    with BuildSketch(Plane(origin=(58, -35, 50), x_dir=(0, 1, 0), z_dir=(0, 0, -1))):
        with BuildLine():
            Line((0, 3), (0, 30))
            Line((0, 30), (5, 30))
            Line((5, 30), (5, 3))
            ThreePointArc((5, 3), (5.878679656, 0.878679656), (8, 0))
            Line((8, 0), (8, -5))
            ThreePointArc((8, -5), (2.343145751, -2.656854249), (0, 3))
        make_face()
    extrude(amount=SM_EDGE_FLANGE_20_DEPTH)

    # 边线-法兰21 strip (across the edge) → 边线-法兰21 strip cut (cut)
    with BuildSketch(Plane(origin=(58, -35, -10), x_dir=(0, 1, 0), z_dir=(0, 0, -1))):
        with Locations((-5, -2.5)):
            Rectangle(SM_EDGE_FLANGE_21_STRIP_W, SM_EDGE_FLANGE_21_STRIP_H)
    extrude(amount=SM_EDGE_FLANGE_21_STRIP_CUT_DEPTH, mode=Mode.SUBTRACT)

    # 边线-法兰21 section (across the edge) → 边线-法兰21 (add)
    with BuildSketch(Plane(origin=(58, -35, -10), x_dir=(0, 1, 0), z_dir=(0, 0, -1))):
        with BuildLine():
            Line((0, 3), (0, 30))
            Line((0, 30), (5, 30))
            Line((5, 30), (5, 3))
            ThreePointArc((5, 3), (5.878679656, 0.878679656), (8, 0))
            Line((8, 0), (8, -5))
            ThreePointArc((8, -5), (2.343145751, -2.656854249), (0, 3))
        make_face()
    extrude(amount=SM_EDGE_FLANGE_21_DEPTH)

    # 草图80 → 切除-拉伸1 (cut)
    with BuildSketch(Plane(origin=(0, 0, 0), x_dir=(1, 0, 0), z_dir=(0, 1, 0)).offset(CUT_EXTRUDE_START)):
        with Locations(Location((-75, 40, 0), (0, 0, 270))):
            Circle(SKETCH_80_R)
        with Locations(Location((75, 40, 0), (0, 0, 270))):
            Circle(SKETCH_80_R)
        with Locations(Location((-75, -40, 0), (0, 0, 270))):
            Circle(SKETCH_80_R)
        with Locations(Location((75, -40, 0), (0, 0, 270))):
            Circle(SKETCH_80_R)
    extrude(amount=CUT_EXTRUDE_1_DEPTH, mode=Mode.SUBTRACT)

    # 草图83 → 切除-拉伸3 (cut, two sides: drawn at the far end of the back side and taken through both)
    with BuildSketch(Plane.XY.offset(-CUT_EXTRUDE_3_DEPTH_BACK)):
        with Locations((0, 50)):
            Circle(SKETCH_83_R)
        with Locations((0, 30)):
            Circle(SKETCH_83_R)
    extrude(amount=CUT_EXTRUDE_3_DEPTH + CUT_EXTRUDE_3_DEPTH_BACK, mode=Mode.SUBTRACT)

    # 草图84 → 切除-拉伸5 (cut)
    with BuildSketch(Plane(origin=(0, 0, 0), x_dir=(1, 0, 0), z_dir=(0, 1, 0)).offset(CUT_EXTRUDE_START_2)):
        with Locations(Location((75, 22.5, 0), (0, 0, 270))):
            Circle(SKETCH_84_R)
        with Locations(Location((75, -22.5, 0), (0, 0, 270))):
            Circle(SKETCH_84_R)
        with Locations(Location((-75, -22.5, 0), (0, 0, 270))):
            Circle(SKETCH_84_R)
        with Locations(Location((-75, 22.5, 0), (0, 0, 270))):
            Circle(SKETCH_84_R)
    extrude(amount=-CUT_EXTRUDE_5_DEPTH, mode=Mode.SUBTRACT)


solid = part.part
